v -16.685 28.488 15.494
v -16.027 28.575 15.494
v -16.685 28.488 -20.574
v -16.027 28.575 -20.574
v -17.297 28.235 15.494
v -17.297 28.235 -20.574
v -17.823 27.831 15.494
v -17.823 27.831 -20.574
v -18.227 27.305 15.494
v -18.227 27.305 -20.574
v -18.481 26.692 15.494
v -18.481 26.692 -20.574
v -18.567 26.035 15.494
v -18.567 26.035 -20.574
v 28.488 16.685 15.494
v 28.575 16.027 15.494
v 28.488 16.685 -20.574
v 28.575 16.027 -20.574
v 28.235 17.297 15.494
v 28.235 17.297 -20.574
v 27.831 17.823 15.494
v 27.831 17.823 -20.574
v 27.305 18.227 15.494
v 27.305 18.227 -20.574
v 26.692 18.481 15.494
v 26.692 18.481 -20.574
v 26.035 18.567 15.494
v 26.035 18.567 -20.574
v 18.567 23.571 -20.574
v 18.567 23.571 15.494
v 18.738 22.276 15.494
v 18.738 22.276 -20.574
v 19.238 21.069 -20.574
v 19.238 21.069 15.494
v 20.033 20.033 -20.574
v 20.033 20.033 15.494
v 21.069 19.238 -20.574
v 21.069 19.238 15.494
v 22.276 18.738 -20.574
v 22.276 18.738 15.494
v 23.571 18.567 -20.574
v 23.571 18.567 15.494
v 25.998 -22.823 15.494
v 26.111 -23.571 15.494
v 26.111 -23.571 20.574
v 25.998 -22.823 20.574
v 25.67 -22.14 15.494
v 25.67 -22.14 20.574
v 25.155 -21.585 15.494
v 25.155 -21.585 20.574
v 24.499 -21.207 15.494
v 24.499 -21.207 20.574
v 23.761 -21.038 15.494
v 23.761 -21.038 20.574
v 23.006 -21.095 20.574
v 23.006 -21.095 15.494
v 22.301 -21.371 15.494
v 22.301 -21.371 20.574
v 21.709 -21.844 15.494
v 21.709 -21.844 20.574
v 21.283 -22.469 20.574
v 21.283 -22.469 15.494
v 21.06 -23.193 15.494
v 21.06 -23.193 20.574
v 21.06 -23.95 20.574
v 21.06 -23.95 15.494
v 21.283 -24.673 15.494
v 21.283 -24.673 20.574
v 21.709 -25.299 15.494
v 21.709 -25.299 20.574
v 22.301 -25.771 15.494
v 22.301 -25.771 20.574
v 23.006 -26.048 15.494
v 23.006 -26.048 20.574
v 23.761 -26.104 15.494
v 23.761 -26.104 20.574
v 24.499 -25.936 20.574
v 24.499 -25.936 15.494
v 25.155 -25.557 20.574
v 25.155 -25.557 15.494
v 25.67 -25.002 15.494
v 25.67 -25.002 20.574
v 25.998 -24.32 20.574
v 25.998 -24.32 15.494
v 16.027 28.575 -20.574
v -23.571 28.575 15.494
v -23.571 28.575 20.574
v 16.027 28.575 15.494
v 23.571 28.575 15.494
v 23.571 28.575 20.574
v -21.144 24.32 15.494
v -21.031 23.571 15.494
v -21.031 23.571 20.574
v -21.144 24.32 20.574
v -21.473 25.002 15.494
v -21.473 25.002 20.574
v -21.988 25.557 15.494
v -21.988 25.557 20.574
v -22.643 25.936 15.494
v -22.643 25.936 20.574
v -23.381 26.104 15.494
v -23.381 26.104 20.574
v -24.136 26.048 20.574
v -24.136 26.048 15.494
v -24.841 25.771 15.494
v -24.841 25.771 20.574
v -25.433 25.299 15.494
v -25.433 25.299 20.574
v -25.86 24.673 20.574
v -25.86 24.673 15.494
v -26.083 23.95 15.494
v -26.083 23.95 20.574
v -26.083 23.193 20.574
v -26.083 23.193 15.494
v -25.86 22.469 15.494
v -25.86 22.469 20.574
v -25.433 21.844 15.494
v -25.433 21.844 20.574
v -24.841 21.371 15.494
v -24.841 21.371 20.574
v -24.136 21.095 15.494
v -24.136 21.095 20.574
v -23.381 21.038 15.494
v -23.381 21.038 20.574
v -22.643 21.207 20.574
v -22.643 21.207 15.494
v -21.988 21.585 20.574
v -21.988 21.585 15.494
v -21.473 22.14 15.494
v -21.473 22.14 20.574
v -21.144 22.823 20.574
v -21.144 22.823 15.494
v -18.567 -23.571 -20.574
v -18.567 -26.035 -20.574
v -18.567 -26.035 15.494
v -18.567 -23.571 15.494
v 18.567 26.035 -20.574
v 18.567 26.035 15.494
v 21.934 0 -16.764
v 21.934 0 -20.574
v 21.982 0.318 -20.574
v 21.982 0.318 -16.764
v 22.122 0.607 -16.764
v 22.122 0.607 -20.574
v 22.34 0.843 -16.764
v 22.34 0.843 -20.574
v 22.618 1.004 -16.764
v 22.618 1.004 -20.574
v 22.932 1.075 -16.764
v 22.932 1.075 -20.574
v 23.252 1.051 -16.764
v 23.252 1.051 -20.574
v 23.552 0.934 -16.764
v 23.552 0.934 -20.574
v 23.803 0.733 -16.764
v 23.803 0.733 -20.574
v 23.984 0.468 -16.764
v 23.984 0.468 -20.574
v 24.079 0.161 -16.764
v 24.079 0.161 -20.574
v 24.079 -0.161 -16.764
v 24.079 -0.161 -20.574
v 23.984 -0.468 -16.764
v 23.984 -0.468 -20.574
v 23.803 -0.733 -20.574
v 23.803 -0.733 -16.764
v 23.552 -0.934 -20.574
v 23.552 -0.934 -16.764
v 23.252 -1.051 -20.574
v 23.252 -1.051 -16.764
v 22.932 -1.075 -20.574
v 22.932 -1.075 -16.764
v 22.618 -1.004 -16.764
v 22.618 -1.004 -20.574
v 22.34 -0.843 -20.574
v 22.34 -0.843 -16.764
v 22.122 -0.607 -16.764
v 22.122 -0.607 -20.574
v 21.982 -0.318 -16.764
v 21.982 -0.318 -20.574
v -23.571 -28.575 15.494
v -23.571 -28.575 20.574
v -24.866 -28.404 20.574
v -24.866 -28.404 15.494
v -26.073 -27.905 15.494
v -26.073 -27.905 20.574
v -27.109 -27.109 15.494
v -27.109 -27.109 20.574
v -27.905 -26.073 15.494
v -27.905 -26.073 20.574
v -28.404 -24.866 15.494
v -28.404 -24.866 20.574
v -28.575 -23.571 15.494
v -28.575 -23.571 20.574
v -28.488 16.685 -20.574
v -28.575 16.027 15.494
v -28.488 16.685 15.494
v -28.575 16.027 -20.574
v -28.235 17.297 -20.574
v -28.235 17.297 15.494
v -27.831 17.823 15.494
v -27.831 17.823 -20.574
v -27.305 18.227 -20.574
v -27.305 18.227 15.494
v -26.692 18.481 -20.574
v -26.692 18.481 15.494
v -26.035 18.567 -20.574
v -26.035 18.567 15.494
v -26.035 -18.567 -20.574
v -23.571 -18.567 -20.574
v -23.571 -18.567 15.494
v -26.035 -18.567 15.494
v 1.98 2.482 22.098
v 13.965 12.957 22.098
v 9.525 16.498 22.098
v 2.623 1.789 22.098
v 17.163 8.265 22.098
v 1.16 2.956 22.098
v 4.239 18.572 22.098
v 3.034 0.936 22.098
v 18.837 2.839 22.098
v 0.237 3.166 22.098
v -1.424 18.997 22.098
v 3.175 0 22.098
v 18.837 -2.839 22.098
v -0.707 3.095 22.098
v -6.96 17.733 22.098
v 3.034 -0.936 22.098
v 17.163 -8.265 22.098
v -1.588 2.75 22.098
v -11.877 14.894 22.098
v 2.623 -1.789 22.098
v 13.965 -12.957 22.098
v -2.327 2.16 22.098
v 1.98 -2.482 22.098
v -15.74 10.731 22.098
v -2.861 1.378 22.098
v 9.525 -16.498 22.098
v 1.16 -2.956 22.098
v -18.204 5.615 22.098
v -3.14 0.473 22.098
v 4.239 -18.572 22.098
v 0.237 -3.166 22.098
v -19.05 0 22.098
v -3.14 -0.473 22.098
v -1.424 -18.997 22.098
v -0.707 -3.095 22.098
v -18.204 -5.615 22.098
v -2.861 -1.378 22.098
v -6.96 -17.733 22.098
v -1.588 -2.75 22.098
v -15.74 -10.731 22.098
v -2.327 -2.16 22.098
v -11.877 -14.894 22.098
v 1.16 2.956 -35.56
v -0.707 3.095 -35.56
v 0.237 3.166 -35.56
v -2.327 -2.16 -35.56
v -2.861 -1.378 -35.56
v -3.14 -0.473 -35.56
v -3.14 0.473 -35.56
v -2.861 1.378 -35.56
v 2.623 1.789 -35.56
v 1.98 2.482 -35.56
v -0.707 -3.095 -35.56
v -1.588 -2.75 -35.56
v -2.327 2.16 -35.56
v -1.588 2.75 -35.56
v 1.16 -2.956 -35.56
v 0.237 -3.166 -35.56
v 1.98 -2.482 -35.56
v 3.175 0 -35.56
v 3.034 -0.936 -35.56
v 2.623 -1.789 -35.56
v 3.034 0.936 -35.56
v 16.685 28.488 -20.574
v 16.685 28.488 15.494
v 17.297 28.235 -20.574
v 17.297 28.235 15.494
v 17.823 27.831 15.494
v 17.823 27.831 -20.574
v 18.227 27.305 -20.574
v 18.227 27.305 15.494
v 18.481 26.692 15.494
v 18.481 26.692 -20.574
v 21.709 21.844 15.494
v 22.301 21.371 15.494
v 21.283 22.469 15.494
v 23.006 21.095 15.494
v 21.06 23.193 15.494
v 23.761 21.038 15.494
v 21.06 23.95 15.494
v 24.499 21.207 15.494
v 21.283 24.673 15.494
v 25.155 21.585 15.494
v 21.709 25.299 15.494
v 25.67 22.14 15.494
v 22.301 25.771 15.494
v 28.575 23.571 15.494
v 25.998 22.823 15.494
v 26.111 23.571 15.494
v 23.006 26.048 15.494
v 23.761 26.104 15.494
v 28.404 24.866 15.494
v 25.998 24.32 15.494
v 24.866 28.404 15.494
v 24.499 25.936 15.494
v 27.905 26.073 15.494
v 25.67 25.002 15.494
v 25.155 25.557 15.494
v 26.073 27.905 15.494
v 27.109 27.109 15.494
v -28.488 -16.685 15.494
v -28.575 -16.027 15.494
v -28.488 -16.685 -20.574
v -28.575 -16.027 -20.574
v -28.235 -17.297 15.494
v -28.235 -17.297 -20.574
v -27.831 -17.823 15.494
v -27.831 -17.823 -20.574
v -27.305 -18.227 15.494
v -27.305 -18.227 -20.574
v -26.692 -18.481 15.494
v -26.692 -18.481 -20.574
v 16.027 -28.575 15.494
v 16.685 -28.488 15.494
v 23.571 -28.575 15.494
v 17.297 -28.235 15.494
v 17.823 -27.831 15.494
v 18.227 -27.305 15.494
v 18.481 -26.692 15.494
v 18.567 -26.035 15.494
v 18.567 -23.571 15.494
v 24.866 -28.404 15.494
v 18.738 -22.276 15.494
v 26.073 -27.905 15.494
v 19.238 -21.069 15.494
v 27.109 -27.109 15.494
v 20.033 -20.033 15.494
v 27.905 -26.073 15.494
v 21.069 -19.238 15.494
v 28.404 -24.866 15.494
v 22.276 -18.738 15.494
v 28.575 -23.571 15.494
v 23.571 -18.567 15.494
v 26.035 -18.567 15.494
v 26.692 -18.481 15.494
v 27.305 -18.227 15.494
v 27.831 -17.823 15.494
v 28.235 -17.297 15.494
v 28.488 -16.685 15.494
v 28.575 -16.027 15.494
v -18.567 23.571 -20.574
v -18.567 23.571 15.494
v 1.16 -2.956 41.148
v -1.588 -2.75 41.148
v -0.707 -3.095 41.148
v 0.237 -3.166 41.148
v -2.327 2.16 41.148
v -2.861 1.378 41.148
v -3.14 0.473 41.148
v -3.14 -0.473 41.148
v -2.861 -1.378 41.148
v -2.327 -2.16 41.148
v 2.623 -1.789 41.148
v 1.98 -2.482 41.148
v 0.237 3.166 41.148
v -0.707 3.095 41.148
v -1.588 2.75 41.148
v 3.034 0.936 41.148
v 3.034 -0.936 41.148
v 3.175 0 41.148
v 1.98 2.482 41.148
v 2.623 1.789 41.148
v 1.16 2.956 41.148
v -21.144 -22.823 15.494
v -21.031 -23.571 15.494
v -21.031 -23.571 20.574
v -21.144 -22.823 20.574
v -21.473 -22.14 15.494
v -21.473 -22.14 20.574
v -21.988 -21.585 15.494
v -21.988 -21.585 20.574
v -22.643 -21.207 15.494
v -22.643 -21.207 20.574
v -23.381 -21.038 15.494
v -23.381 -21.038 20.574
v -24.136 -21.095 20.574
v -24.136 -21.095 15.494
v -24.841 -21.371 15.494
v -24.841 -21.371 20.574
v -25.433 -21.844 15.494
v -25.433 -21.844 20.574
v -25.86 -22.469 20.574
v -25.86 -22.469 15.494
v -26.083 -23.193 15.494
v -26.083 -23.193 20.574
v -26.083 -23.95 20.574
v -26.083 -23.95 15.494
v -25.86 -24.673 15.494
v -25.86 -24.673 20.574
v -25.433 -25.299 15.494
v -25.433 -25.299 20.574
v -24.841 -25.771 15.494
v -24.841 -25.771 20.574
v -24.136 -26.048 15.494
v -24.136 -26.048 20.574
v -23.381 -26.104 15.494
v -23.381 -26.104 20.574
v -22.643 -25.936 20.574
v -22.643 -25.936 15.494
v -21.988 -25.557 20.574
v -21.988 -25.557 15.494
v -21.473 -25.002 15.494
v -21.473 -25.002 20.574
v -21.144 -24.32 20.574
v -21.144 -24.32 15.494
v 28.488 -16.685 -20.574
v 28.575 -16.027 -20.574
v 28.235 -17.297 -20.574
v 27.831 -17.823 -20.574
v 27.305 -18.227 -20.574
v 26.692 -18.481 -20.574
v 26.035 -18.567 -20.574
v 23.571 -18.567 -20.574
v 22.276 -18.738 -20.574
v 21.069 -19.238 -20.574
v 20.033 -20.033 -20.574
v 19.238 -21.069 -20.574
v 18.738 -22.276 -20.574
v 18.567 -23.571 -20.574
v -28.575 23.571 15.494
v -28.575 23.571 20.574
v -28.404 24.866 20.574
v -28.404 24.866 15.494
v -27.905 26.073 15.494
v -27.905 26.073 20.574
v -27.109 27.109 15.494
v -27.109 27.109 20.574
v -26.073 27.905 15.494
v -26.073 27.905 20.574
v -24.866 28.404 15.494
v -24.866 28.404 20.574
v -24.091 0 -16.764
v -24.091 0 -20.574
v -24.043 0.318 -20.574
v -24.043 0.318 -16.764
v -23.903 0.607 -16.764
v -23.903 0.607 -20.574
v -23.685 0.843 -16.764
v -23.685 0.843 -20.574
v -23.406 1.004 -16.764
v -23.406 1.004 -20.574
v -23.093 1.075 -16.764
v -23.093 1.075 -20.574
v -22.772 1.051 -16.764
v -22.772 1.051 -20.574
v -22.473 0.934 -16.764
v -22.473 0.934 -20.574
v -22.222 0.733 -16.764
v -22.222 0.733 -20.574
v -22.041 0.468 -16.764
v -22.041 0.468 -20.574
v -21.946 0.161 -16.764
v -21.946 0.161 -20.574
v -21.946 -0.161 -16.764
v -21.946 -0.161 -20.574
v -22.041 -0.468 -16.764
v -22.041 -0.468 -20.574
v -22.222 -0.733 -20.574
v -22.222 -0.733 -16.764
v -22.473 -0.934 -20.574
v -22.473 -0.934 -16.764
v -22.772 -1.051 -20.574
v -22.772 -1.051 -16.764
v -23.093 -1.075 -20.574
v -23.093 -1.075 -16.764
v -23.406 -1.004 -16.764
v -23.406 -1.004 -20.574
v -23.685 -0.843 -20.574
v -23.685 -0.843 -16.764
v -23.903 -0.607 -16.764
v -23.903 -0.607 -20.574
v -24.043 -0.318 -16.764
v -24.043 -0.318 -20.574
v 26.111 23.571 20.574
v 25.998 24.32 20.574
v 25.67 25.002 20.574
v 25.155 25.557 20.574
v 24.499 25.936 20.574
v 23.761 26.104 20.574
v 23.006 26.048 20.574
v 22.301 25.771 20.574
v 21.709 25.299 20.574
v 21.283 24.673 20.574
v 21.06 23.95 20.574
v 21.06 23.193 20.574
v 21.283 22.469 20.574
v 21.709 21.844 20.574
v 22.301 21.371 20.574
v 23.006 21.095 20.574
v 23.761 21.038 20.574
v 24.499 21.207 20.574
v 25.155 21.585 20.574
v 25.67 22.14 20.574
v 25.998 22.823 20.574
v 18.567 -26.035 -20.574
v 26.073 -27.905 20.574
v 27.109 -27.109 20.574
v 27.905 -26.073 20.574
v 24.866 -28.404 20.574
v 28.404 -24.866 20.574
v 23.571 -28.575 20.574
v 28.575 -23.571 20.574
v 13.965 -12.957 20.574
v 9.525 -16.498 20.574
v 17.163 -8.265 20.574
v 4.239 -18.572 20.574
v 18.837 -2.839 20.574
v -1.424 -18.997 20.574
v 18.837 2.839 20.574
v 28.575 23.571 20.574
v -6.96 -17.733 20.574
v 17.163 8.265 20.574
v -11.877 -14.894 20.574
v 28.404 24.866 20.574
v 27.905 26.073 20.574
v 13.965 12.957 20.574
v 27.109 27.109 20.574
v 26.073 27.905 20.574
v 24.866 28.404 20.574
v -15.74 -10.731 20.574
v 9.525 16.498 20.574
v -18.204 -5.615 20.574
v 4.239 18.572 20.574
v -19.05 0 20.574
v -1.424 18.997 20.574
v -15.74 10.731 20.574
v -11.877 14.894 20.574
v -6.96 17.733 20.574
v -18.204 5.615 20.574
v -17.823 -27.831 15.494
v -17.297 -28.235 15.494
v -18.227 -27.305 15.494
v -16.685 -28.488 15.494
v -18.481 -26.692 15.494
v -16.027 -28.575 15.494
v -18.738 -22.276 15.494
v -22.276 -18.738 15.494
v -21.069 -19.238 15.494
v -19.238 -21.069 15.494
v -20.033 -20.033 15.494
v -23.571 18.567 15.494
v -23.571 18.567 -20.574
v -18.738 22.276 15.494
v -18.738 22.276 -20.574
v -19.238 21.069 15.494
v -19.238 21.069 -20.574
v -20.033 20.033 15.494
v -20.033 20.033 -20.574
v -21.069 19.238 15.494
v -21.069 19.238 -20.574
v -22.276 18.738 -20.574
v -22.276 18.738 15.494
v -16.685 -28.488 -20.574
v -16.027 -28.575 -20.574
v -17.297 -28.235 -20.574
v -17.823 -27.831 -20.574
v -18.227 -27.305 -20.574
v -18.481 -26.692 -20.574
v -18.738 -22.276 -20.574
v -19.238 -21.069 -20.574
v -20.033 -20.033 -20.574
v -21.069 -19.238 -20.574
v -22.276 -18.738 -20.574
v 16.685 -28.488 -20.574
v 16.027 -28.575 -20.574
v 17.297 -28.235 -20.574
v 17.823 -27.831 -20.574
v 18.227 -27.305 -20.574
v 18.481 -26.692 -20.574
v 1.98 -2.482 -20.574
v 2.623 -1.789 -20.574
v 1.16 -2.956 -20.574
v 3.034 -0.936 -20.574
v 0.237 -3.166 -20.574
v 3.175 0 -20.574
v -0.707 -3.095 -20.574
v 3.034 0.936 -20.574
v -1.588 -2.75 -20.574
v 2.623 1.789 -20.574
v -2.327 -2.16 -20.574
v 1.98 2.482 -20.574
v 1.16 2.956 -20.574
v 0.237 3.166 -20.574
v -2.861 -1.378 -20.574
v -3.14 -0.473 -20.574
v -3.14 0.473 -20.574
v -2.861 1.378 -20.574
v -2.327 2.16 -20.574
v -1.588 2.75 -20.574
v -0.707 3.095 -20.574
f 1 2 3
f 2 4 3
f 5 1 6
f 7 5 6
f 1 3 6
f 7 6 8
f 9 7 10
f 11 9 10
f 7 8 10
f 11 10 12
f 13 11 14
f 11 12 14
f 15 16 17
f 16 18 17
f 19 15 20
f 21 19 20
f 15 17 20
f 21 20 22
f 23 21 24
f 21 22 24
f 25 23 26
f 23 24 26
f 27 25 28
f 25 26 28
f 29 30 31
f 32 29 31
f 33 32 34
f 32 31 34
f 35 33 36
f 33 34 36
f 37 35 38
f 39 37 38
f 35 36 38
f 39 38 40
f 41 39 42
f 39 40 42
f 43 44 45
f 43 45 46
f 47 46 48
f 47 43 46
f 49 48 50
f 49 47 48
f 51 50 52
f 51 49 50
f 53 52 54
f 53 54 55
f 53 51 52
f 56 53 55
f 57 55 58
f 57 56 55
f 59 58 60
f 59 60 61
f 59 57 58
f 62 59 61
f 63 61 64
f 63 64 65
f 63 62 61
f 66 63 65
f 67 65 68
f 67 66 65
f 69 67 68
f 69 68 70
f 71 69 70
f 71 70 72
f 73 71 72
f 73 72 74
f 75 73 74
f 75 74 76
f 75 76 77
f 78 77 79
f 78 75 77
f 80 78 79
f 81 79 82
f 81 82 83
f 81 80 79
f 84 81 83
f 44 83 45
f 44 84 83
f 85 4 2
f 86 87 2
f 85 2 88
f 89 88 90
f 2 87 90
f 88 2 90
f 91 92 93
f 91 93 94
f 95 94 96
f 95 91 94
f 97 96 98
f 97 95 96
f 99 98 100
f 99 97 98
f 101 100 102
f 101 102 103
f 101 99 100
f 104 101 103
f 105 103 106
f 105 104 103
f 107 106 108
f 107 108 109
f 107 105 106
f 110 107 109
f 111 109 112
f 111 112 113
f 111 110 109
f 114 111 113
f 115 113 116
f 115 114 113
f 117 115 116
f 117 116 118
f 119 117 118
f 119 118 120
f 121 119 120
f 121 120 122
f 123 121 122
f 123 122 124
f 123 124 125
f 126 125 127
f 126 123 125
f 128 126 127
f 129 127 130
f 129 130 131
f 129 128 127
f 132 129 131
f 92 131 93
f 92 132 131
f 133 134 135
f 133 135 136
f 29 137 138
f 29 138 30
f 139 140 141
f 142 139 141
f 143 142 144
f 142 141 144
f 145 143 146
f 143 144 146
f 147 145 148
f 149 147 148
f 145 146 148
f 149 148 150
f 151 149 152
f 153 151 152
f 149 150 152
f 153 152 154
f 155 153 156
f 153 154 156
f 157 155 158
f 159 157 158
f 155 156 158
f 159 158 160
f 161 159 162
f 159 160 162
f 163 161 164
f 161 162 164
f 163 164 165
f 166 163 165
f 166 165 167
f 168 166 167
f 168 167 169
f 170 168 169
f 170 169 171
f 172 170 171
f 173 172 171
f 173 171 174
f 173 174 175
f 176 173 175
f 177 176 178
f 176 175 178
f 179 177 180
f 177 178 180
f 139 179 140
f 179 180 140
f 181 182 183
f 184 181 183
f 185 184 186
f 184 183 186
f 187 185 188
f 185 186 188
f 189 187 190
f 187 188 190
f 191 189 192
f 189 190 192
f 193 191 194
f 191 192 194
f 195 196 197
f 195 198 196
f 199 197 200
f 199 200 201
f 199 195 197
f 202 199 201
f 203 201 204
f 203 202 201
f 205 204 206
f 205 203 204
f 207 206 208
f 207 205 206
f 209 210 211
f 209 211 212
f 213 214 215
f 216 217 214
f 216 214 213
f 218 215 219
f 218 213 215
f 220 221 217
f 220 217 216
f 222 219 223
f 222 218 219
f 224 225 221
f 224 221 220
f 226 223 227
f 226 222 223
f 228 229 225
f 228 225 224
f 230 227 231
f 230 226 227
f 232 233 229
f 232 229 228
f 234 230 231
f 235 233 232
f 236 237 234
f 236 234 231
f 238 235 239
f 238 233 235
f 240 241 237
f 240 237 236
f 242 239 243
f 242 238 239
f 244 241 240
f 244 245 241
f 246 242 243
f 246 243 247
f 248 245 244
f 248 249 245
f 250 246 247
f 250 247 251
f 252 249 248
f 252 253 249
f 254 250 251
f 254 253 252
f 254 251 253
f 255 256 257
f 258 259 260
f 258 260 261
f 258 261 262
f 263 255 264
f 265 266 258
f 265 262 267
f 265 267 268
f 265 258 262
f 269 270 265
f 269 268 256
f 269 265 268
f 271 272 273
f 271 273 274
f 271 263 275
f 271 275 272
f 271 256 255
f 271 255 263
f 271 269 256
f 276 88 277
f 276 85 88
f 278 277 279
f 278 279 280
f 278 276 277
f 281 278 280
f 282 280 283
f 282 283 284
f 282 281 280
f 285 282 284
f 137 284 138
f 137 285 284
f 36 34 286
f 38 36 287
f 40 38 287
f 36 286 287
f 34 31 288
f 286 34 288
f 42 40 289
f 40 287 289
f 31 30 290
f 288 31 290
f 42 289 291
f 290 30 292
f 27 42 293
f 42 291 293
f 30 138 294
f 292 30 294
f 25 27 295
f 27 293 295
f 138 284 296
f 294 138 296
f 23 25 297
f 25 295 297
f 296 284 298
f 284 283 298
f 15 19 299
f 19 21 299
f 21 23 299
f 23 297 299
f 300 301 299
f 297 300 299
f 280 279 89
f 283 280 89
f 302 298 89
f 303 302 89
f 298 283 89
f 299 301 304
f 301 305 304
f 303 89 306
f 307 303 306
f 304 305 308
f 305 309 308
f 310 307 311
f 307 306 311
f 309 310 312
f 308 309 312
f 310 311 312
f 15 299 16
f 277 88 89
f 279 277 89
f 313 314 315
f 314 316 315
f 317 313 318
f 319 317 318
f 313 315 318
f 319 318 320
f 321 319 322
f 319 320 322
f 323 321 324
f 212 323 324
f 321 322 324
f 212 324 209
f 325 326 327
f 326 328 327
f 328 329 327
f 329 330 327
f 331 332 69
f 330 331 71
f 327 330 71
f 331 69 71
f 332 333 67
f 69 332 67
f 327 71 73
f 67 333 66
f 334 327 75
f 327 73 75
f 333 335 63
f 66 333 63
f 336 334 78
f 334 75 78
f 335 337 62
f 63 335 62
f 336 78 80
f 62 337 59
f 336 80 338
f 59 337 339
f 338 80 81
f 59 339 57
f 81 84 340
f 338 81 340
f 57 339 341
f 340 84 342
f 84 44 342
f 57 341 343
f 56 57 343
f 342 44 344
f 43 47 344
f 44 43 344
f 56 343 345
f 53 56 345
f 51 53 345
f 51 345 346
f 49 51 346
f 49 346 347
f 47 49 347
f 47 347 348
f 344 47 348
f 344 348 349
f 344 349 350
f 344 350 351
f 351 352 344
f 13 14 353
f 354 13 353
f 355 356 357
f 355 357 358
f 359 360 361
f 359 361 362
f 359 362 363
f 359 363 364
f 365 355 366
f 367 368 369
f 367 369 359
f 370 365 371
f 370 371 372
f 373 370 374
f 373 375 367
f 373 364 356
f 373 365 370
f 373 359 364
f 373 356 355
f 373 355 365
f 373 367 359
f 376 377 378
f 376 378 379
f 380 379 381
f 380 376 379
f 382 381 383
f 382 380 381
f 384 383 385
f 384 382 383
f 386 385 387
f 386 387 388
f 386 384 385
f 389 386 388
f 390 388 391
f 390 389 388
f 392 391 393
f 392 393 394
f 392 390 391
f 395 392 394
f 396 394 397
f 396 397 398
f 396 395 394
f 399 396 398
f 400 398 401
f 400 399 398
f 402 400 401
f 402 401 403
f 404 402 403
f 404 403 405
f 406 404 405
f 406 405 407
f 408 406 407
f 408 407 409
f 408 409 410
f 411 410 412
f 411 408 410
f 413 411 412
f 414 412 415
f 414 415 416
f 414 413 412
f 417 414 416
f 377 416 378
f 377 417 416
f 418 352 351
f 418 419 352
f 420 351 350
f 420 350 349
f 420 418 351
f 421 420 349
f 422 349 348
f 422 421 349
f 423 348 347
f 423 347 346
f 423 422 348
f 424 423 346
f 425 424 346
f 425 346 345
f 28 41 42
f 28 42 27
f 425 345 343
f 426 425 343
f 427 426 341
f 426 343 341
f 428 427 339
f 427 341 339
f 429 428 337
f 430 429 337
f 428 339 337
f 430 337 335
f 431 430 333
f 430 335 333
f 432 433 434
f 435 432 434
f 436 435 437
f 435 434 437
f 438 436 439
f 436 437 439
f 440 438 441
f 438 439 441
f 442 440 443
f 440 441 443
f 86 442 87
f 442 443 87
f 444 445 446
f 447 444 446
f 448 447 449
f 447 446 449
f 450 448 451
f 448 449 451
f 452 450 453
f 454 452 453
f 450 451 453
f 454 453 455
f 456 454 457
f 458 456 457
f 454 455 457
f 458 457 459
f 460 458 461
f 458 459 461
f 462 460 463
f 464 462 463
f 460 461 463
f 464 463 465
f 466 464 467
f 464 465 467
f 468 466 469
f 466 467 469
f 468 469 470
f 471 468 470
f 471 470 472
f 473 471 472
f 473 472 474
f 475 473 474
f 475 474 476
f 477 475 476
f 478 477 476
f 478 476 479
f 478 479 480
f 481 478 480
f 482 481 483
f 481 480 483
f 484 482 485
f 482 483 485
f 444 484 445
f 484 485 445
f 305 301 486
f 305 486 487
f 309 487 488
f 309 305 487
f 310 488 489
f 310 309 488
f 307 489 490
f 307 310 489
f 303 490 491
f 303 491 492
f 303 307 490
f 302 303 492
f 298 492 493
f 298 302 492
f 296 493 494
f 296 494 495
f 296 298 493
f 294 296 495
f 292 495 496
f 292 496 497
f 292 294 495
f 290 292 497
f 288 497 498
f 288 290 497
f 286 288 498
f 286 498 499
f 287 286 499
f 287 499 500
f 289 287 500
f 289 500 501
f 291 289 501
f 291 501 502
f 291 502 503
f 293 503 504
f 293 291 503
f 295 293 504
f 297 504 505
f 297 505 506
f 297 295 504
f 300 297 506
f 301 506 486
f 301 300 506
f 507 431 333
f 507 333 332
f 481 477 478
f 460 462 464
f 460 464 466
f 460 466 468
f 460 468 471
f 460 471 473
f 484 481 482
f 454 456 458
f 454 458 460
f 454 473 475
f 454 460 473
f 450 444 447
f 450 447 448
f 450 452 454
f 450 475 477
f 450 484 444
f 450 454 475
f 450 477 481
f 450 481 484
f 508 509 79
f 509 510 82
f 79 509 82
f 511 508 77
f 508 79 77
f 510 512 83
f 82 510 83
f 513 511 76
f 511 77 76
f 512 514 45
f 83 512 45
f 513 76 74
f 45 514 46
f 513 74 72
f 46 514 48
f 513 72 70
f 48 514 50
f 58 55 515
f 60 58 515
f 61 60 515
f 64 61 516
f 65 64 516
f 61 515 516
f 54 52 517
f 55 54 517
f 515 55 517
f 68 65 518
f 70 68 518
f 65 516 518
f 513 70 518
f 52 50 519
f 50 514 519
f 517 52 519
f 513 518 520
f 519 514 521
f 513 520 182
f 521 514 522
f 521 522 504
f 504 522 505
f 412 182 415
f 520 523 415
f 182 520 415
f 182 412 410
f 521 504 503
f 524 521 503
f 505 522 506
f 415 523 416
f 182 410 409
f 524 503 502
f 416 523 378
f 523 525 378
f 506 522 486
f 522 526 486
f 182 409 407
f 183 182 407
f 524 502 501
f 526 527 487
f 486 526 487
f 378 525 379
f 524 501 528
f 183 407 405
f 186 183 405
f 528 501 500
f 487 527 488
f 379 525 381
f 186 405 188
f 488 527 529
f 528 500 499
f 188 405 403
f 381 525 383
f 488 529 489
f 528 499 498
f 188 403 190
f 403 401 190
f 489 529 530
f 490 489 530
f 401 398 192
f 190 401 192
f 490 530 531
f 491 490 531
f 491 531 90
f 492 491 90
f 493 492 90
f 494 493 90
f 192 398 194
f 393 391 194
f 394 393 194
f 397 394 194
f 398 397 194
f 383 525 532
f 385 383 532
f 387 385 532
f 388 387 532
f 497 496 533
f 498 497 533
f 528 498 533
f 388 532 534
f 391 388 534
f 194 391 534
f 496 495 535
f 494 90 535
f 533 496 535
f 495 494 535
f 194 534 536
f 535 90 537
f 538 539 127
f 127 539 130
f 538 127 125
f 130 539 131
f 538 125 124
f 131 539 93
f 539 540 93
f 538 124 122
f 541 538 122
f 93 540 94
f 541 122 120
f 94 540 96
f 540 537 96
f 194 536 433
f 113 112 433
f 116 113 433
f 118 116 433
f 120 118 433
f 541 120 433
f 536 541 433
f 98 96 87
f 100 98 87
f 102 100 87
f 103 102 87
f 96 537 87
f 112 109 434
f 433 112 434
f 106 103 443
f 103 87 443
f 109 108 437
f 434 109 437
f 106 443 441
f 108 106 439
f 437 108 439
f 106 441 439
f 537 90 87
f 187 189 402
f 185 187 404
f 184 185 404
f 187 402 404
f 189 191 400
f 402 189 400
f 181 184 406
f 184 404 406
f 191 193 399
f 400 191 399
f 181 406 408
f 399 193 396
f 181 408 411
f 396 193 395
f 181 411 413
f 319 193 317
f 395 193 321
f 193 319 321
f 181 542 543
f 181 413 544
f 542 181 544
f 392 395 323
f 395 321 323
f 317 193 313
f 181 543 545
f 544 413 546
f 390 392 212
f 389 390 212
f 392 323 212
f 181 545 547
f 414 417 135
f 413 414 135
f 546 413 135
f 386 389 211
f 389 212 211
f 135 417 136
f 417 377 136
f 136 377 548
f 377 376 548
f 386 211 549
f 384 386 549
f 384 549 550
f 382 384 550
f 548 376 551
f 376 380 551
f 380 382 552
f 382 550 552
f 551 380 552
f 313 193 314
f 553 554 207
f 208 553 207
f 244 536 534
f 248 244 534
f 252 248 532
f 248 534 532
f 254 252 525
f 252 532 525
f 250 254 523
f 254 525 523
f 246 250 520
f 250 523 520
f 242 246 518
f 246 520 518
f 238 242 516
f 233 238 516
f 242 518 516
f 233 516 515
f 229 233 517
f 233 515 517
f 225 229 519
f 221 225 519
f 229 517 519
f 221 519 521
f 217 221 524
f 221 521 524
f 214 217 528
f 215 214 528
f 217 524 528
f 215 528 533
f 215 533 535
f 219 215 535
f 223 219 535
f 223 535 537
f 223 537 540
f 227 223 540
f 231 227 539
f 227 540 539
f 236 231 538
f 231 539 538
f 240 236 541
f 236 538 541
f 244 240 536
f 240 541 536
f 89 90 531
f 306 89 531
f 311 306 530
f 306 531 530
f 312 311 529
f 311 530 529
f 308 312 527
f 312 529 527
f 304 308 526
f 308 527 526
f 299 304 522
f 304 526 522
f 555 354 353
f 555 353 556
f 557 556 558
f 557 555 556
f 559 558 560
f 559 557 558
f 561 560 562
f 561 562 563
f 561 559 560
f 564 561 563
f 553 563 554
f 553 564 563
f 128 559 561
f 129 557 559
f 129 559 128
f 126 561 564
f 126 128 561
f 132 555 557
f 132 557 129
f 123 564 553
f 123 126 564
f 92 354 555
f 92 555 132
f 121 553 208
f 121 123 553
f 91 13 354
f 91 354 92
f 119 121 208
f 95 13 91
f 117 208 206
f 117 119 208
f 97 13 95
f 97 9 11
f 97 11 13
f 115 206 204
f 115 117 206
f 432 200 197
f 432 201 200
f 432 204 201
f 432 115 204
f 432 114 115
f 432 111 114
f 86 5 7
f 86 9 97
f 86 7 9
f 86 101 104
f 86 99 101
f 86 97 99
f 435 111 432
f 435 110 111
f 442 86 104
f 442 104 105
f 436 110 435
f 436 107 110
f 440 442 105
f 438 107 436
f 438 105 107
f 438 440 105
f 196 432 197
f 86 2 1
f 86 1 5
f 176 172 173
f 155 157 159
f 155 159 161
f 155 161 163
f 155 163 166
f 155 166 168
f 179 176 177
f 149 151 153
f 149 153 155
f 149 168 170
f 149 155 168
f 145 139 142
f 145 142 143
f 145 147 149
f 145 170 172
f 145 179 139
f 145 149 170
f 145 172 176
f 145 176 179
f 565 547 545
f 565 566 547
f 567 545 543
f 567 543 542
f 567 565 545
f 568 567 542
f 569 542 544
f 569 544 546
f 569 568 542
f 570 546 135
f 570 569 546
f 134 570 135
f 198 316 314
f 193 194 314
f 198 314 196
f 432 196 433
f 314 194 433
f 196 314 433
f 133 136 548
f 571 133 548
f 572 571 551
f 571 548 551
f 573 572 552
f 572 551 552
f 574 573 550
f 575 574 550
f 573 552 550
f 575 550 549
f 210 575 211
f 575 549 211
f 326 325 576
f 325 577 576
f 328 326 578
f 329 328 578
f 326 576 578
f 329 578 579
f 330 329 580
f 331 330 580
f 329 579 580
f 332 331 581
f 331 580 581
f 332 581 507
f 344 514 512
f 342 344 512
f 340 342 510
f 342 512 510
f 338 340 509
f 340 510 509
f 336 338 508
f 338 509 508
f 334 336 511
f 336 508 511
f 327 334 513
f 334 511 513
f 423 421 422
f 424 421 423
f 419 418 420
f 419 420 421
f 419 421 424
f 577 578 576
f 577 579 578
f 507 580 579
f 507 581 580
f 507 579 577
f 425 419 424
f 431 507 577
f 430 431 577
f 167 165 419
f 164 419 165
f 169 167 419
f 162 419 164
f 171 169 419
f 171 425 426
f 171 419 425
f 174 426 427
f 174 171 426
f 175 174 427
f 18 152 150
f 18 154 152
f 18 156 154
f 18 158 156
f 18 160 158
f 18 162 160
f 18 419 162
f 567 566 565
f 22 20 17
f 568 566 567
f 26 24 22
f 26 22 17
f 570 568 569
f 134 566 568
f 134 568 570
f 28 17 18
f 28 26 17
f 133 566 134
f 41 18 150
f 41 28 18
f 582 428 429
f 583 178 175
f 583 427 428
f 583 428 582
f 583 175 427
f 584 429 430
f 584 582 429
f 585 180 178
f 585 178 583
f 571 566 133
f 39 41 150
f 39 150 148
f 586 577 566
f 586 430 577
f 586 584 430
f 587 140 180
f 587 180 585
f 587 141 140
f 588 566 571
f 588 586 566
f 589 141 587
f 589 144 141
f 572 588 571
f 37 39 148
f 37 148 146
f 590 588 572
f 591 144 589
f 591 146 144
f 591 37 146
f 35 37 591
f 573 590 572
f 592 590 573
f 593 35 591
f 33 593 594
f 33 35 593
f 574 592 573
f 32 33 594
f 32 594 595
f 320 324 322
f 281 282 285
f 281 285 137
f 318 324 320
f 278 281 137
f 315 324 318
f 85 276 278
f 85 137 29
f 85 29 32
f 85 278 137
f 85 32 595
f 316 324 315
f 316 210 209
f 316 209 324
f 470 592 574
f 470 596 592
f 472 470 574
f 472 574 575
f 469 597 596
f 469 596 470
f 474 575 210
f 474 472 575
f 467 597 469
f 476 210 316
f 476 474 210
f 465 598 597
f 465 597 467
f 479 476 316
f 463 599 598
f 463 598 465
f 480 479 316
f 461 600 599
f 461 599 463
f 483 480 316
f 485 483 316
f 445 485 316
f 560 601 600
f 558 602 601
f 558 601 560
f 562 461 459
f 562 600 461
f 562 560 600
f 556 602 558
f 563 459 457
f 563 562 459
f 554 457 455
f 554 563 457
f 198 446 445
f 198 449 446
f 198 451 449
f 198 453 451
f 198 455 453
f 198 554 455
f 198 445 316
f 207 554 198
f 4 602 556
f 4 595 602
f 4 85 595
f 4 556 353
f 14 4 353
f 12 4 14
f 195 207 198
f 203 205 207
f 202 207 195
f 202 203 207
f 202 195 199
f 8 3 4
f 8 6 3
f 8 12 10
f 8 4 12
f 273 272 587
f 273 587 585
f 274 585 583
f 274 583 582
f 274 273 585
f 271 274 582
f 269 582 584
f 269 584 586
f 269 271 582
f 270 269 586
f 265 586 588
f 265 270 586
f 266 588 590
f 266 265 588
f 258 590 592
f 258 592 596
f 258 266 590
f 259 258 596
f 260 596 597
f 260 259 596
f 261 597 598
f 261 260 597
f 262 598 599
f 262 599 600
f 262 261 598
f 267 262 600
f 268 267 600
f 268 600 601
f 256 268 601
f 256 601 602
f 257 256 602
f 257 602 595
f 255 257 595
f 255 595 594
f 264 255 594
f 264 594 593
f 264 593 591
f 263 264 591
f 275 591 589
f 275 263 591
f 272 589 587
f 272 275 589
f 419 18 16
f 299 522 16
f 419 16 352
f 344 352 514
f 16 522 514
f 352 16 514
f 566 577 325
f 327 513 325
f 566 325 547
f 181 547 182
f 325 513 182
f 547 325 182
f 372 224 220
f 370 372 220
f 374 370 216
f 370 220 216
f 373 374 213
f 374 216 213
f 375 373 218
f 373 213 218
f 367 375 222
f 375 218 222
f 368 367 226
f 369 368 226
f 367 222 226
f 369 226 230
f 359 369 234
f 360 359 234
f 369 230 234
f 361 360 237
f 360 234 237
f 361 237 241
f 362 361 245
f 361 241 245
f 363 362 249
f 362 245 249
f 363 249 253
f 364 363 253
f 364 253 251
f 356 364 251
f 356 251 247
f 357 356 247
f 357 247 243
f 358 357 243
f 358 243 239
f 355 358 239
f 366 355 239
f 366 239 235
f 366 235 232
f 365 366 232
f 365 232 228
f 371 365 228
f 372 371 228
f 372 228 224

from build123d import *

# Parameters (mm, degrees)
SKETCH1_R      = 2.54
EXTRUDE1_DEPTH = 20.574
SKETCH2_R      = 19.05
EXTRUDE2_DEPTH = 1.524
SKETCH3_R      = 3.175
EXTRUDE3_DEPTH = 20.574
EXTRUDE4_START = -36.068
EXTRUDE4_DEPTH = 36.068
FILLET1_R      = 2.54
EXTRUDE5_START = 14.986
SKETCH5_R      = 3.175
EXTRUDE5_DEPTH = 14.986
SKETCH6_R      = 1.07823
EXTRUDE6_DEPTH = 3.81


with BuildPart() as part:
    # Sketch1 → Extrude1 (new, symmetric)
    with BuildSketch(Plane.XY):
        with BuildLine():
            Line((-23.5712, 28.575), (23.5712, 28.575))
            ThreePointArc((23.5712, 28.575), (27.109420912, 27.109420912), (28.575, 23.5712))
            Line((28.575, 23.5712), (28.575, -23.5712))
            ThreePointArc((28.575, -23.5712), (27.109420912, -27.109420912), (23.5712, -28.575))
            Line((23.5712, -28.575), (-23.5712, -28.575))
            ThreePointArc((-23.5712, -28.575), (-27.109420912, -27.109420912), (-28.575, -23.5712))
            Line((-28.575, -23.5712), (-28.575, 23.5712))
            ThreePointArc((-28.575, 23.5712), (-27.109420912, 27.109420912), (-23.5712, 28.575))
        make_face()
        with Locations((-23.5712, 23.5712)):
            Circle(SKETCH1_R, mode=Mode.SUBTRACT)
        with Locations((23.5712, 23.5712)):
            Circle(SKETCH1_R, mode=Mode.SUBTRACT)
        with Locations((23.5712, -23.5712)):
            Circle(SKETCH1_R, mode=Mode.SUBTRACT)
        with Locations((-23.5712, -23.5712)):
            Circle(SKETCH1_R, mode=Mode.SUBTRACT)
    extrude(amount=EXTRUDE1_DEPTH, both=True)

    # Sketch2 → Extrude2 (add)
    with BuildSketch(Plane.XY.offset(20.574)):
        with Locations(Location((0, 0, 0), (0, 0, 180))):
            Circle(SKETCH2_R)
    extrude(amount=EXTRUDE2_DEPTH)

    # Sketch3 → Extrude3 (add)
    with BuildSketch(Plane.XY.offset(20.574)):
        Circle(SKETCH3_R)
    extrude(amount=EXTRUDE3_DEPTH)

    # Sketch4 → Extrude4 (cut)
    with BuildSketch(Plane(origin=(0, 0, -20.574), x_dir=(-1, 0, 0), z_dir=(0, 0, -1)).offset(EXTRUDE4_START)):
        with BuildLine():
            Line((-23.5712, 18.5674), (-28.575, 18.5674))
            Line((-28.575, 18.5674), (-28.575, 23.5712))
            ThreePointArc((-28.575, 23.5712), (-27.109420912, 27.109420912), (-23.5712, 28.575))
            Line((-23.5712, 28.575), (-18.5674, 28.575))
            Line((-18.5674, 28.575), (-18.5674, 23.5712))
            ThreePointArc((-18.5674, 23.5712), (-20.032979088, 20.032979088), (-23.5712, 18.5674))
        make_face()
        with BuildLine():
            Line((23.5712, 18.5674), (28.575, 18.5674))
            Line((28.575, 18.5674), (28.575, 23.5712))
            ThreePointArc((28.575, 23.5712), (27.109420912, 27.109420912), (23.5712, 28.575))
            Line((23.5712, 28.575), (18.5674, 28.575))
            Line((18.5674, 28.575), (18.5674, 23.5712))
            ThreePointArc((18.5674, 23.5712), (20.032979088, 20.032979088), (23.5712, 18.5674))
        make_face()
        with BuildLine():
            Line((23.5712, -18.5674), (28.575, -18.5674))
            Line((28.575, -18.5674), (28.575, -23.5712))
            ThreePointArc((28.575, -23.5712), (27.109420912, -27.109420912), (23.5712, -28.575))
            Line((23.5712, -28.575), (18.5674, -28.575))
            Line((18.5674, -28.575), (18.5674, -23.5712))
            ThreePointArc((18.5674, -23.5712), (20.032979088, -20.032979088), (23.5712, -18.5674))
        make_face()
        with BuildLine():
            Line((-18.5674, -23.5712), (-18.5674, -28.575))
            Line((-18.5674, -28.575), (-23.5712, -28.575))
            ThreePointArc((-23.5712, -28.575), (-27.109420912, -27.109420912), (-28.575, -23.5712))
            Line((-28.575, -23.5712), (-28.575, -18.5674))
            Line((-28.575, -18.5674), (-23.5712, -18.5674))
            ThreePointArc((-23.5712, -18.5674), (-20.032979088, -20.032979088), (-18.5674, -23.5712))
        make_face()
    extrude(amount=EXTRUDE4_DEPTH, mode=Mode.SUBTRACT)

    # Fillet1
    fillet1_edges = [part.edges().sort_by_distance(p)[0] for p in [
        (28.575, -18.5674, -2.54),
        (18.5674, -28.575, -2.54),
        (18.5674, 28.575, -2.54),
        (28.575, 18.5674, -2.54),
        (-28.575, 18.5674, -2.54),
        (-18.5674, 28.575, -2.54),
        (-18.5674, -28.575, -2.54),
        (-28.575, -18.5674, -2.54),
    ]]
    fillet(fillet1_edges, radius=FILLET1_R)

    # Sketch5 → Extrude5 (add)
    with BuildSketch(Plane(origin=(0, 0, -20.574), x_dir=(-1, 0, 0), z_dir=(0, 0, -1)).offset(EXTRUDE5_START)):
        with Locations(Location((0, 0, 0), (0, 0, 180))):
            Circle(SKETCH5_R)
    extrude(amount=-EXTRUDE5_DEPTH)

    # Sketch6 → Extrude6 (cut)
    with BuildSketch(Plane(origin=(0, 0, -20.574), x_dir=(-1, 0, 0), z_dir=(0, 0, -1))):
        with Locations((-23.0124, 0)):
            Circle(SKETCH6_R)
        with Locations((23.0124, 0)):
            Circle(SKETCH6_R)
    extrude(amount=-EXTRUDE6_DEPTH, mode=Mode.SUBTRACT)


solid = part.part
